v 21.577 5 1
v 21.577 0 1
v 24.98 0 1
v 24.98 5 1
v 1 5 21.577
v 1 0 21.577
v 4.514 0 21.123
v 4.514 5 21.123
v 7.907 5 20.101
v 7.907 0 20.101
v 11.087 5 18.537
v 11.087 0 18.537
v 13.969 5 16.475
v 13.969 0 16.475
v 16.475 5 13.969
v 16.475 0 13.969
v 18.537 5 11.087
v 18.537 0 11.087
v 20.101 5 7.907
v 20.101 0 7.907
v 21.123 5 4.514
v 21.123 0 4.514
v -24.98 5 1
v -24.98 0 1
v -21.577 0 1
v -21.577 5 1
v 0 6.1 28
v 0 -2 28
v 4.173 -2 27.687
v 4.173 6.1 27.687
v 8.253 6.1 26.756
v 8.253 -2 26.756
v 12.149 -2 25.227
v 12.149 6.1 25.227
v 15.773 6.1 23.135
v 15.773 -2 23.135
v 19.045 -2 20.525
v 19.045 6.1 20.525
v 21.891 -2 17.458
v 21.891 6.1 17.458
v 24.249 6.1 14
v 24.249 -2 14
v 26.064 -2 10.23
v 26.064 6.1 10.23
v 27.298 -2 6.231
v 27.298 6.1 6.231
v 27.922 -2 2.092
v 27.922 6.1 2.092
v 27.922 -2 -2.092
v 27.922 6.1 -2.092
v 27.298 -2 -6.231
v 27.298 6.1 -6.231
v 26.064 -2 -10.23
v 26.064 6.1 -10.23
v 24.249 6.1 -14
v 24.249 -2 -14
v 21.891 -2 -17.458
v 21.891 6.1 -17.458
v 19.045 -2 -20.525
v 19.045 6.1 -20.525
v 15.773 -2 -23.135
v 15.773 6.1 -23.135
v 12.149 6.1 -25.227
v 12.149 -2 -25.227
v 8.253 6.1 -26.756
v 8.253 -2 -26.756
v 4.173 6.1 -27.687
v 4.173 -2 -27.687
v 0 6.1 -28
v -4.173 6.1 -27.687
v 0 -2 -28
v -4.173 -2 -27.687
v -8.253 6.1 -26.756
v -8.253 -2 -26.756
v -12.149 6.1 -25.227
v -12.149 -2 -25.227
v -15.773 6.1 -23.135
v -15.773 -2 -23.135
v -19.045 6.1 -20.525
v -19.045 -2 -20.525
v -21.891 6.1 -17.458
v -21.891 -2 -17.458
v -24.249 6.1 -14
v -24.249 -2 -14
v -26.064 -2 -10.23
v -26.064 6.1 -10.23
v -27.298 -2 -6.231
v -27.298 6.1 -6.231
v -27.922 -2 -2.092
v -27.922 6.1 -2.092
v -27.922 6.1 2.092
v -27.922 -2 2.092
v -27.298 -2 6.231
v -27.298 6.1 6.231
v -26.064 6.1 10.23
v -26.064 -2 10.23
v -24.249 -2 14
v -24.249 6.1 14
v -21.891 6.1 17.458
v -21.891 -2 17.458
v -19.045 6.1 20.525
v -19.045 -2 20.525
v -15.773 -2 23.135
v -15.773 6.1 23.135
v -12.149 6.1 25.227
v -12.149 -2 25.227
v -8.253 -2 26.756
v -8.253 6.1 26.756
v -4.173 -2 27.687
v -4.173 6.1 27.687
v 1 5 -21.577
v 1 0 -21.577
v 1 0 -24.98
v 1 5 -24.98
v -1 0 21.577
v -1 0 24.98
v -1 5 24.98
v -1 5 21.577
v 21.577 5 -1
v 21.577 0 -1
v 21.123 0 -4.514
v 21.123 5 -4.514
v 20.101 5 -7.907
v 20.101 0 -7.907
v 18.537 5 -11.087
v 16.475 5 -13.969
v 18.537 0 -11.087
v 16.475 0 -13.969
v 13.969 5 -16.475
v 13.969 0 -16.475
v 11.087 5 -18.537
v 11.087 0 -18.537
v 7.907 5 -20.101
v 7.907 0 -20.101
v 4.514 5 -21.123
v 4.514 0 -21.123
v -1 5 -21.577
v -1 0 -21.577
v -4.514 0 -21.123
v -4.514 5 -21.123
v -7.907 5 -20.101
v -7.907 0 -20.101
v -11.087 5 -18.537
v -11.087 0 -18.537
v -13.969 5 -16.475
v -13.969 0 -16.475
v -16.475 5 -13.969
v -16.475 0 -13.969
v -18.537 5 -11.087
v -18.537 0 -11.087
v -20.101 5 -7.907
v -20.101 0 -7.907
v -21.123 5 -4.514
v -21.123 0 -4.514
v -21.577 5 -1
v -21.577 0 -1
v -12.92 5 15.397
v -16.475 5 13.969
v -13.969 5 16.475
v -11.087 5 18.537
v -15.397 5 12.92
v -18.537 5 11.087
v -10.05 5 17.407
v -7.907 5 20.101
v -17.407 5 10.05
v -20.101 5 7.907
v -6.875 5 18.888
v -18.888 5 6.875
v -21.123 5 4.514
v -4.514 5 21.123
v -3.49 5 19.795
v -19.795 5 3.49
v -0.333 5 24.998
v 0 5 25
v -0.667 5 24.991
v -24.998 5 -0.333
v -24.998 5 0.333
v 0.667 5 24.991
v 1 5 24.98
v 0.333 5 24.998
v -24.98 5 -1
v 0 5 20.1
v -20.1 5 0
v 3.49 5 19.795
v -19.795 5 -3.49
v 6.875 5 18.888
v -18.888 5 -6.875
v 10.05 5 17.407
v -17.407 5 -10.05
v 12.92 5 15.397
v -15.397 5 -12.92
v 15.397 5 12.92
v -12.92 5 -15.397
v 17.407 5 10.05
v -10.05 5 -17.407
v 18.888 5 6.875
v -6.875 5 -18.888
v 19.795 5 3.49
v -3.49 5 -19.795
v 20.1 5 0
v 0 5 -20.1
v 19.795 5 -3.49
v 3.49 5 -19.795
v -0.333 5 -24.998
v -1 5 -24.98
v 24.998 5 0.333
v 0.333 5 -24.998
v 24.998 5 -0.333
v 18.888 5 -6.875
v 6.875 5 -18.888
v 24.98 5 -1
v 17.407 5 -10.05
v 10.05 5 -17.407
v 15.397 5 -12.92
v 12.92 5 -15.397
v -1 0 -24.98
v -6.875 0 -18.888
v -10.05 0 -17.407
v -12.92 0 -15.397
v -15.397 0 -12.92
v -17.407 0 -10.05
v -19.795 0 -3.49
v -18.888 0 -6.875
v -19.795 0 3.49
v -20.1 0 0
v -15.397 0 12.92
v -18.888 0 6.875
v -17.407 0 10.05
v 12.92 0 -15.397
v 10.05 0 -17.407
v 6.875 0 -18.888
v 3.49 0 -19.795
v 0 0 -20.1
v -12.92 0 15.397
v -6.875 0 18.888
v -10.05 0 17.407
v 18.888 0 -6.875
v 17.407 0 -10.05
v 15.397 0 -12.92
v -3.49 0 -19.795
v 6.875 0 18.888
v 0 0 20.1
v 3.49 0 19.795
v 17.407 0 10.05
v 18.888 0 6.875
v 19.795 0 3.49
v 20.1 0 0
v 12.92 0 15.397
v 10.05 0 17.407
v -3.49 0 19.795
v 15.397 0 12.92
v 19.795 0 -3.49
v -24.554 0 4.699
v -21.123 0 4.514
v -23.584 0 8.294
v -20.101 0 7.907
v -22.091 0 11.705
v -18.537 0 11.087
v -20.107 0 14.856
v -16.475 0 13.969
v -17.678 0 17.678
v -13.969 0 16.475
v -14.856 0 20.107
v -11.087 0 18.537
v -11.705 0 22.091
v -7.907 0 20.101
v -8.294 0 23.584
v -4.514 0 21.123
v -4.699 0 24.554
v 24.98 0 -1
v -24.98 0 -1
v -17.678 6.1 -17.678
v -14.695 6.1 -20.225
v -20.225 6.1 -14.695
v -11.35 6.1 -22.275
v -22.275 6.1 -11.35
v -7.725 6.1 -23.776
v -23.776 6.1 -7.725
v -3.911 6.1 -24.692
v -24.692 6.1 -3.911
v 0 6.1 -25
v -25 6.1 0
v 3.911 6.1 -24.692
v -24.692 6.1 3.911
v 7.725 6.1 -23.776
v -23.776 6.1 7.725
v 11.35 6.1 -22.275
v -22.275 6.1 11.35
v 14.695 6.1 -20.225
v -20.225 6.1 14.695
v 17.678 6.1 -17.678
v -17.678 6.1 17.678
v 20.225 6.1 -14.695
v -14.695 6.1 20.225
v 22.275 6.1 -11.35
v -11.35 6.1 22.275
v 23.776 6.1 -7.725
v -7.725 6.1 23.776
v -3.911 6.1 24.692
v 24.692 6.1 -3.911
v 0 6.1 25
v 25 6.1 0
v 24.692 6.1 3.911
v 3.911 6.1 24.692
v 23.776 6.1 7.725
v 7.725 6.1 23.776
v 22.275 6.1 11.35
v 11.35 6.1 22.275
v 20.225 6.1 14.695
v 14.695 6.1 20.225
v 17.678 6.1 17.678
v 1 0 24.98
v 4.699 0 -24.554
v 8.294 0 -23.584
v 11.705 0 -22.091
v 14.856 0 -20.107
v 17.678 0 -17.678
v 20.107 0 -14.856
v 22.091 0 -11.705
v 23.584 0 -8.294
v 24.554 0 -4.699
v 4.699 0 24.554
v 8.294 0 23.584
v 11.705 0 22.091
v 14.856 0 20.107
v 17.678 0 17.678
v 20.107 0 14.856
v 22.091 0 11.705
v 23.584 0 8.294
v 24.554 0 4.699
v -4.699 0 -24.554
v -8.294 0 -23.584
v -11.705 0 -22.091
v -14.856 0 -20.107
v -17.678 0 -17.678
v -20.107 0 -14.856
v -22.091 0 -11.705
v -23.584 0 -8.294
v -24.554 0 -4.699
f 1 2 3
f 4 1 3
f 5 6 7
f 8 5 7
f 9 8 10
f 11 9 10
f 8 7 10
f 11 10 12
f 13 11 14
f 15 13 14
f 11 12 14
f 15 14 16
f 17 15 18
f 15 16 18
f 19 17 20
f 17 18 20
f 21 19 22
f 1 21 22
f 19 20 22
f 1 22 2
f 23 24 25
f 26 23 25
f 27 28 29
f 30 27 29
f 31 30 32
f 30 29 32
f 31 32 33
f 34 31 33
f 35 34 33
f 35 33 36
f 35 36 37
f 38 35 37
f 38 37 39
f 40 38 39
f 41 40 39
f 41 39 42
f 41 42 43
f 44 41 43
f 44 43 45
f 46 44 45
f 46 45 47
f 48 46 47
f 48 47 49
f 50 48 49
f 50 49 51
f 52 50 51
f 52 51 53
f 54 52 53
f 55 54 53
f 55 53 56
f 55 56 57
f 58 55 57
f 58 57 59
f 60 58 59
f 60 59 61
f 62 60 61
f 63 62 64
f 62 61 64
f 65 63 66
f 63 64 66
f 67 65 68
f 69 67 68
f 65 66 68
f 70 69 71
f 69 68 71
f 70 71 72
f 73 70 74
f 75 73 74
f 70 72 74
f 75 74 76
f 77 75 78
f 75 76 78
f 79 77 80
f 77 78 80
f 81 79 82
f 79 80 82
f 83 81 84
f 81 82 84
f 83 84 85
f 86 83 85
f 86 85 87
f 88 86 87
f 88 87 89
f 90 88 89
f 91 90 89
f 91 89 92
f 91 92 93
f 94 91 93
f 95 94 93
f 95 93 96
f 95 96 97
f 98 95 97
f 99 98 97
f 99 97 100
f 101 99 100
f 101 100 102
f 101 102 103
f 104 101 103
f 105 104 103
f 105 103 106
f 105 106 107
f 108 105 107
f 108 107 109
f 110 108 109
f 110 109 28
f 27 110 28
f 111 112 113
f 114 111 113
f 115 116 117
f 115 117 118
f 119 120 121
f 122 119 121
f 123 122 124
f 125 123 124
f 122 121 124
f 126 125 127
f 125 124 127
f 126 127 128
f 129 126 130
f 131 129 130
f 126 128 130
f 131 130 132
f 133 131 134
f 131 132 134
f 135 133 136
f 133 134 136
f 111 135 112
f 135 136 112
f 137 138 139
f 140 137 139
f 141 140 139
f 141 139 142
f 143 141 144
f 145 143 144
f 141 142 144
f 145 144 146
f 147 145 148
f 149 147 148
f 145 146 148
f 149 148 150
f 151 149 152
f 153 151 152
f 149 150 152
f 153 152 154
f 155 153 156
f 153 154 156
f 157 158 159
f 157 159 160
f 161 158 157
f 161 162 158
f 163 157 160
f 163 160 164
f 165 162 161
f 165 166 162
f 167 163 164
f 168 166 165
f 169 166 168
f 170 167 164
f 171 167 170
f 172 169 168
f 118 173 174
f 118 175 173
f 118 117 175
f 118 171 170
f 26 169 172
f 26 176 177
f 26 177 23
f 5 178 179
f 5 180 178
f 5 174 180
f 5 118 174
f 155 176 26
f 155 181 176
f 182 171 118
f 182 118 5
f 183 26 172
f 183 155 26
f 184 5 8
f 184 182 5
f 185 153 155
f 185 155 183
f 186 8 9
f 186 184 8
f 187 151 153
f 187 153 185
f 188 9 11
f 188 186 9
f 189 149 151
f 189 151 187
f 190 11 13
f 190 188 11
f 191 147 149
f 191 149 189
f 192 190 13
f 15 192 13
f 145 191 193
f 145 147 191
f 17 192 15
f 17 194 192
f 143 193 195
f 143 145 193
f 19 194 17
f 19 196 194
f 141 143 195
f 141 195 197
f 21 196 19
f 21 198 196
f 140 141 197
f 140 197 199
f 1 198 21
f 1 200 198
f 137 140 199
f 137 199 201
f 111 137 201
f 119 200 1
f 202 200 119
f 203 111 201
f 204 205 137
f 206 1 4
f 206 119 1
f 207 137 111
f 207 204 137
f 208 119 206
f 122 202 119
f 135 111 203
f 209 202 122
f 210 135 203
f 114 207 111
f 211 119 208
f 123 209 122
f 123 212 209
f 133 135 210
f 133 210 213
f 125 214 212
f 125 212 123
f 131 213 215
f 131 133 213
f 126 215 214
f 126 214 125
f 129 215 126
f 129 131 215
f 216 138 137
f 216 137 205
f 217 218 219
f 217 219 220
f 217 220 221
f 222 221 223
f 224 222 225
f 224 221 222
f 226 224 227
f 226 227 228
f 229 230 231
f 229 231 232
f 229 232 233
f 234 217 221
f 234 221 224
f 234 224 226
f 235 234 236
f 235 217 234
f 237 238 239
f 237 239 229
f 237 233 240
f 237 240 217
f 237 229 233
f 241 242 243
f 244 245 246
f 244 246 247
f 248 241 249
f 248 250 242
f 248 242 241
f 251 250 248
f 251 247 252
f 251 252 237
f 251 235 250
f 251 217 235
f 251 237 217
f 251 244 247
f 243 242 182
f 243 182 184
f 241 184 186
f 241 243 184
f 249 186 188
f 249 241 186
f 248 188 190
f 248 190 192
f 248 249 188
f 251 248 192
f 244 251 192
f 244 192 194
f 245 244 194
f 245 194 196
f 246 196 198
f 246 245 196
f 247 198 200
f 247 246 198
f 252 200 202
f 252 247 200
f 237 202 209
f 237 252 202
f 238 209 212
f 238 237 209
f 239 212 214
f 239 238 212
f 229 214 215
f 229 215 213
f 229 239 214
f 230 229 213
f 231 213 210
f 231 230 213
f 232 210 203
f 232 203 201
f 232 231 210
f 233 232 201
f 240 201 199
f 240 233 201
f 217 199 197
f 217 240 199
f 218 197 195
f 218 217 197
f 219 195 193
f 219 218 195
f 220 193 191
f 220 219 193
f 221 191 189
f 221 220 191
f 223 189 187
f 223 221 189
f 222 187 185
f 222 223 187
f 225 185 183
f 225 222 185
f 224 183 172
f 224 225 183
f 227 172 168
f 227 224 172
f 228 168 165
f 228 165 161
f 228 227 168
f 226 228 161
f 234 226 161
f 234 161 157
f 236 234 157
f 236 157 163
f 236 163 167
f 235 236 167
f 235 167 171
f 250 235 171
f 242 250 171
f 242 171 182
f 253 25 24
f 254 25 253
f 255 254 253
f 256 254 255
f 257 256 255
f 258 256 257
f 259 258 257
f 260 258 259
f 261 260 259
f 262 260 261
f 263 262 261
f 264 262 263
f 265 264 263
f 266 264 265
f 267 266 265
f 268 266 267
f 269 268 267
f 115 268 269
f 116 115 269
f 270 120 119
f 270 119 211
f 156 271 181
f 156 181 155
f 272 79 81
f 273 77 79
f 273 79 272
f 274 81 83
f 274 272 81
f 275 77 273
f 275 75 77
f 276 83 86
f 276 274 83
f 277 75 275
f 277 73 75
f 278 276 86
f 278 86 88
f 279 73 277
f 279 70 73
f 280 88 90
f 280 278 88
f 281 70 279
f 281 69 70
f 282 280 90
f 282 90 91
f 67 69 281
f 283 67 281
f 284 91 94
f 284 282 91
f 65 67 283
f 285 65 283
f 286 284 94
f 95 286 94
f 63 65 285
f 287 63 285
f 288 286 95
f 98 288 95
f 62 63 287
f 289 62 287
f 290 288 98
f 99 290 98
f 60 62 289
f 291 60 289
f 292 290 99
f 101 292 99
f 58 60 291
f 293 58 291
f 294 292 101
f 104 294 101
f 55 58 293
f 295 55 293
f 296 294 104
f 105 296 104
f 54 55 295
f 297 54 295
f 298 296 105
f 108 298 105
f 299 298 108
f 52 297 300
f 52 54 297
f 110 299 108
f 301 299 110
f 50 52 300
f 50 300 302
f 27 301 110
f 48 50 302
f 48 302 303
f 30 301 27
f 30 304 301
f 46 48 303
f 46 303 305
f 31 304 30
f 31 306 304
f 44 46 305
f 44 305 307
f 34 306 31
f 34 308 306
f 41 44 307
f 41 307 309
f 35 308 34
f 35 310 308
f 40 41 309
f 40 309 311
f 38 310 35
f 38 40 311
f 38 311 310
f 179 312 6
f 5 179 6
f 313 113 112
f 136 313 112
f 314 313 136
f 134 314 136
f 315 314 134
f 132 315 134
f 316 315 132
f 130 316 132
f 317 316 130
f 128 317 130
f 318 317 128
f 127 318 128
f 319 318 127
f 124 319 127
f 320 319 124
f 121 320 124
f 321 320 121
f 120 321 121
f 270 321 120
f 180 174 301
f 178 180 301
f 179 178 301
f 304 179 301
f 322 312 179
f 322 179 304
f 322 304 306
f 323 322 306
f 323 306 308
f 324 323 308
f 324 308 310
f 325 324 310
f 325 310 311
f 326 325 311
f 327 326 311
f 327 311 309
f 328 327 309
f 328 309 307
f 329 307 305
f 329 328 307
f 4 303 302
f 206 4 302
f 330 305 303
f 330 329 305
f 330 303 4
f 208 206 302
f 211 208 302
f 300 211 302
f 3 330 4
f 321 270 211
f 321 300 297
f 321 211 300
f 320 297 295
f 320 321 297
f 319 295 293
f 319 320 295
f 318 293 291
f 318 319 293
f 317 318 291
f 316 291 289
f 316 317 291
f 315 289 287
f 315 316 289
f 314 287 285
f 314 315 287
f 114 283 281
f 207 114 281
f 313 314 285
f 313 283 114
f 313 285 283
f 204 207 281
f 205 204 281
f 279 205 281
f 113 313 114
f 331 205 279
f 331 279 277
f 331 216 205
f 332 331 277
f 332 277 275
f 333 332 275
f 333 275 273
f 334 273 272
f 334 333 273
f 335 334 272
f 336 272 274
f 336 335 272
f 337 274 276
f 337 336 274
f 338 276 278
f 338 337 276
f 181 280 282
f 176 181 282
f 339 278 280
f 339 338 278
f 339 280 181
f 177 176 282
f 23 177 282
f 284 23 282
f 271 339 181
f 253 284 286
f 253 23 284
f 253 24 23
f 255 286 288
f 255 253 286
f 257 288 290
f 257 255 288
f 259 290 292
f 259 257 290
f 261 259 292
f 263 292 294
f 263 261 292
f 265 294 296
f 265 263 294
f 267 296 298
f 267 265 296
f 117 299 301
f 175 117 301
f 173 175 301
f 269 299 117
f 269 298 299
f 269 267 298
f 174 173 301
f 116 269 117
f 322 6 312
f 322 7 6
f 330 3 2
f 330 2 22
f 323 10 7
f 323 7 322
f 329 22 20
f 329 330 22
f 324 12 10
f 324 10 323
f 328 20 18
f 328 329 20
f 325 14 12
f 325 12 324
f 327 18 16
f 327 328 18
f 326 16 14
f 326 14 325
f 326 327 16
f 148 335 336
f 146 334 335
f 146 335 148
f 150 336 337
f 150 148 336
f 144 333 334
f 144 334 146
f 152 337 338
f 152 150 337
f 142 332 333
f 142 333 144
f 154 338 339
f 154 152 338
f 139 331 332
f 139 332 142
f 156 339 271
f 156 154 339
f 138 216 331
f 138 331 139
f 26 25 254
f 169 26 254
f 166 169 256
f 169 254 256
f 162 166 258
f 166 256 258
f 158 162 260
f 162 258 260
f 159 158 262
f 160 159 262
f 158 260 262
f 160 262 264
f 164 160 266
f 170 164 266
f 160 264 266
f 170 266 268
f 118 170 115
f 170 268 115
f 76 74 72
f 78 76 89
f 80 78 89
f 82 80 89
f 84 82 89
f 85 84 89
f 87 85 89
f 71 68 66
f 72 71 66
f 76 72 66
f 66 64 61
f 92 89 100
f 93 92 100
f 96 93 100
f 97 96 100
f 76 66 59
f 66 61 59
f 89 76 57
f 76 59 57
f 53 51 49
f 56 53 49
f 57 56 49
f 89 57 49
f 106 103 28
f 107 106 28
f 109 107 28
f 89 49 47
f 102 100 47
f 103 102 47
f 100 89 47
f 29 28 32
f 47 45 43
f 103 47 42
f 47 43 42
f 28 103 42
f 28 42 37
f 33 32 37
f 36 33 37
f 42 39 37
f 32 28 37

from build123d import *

# Parameters (mm, degrees)
SKETCH1_R           = 28
SKETCH1_R_2         = 25
BOSS_EXTRUDE1_DEPTH = 8
BOSS_EXTRUDE2_START = -2
SKETCH1_3_R         = 28
BOSS_EXTRUDE2_DEPTH = 2
SKETCH1_5_R         = 21.6
SKETCH1_5_R_2       = 20.1
BOSS_EXTRUDE3_DEPTH = 5
CUT_EXTRUDE1_START  = -1.9
SKETCH5_R           = 28
CUT_EXTRUDE1_DEPTH  = 1.9
SKETCH10_W          = 2
SKETCH10_H          = 3.423160565
SKETCH10_W_2        = 3.423160565
SKETCH10_H_2        = 2
BOSS_EXTRUDE4_DEPTH = 5


with BuildPart() as part:
    # Sketch1 → Boss-Extrude1 (new body)
    with BuildSketch(Plane(origin=(0, 0, 0), x_dir=(1, 0, 0), z_dir=(0, 1, 0))):
        with Locations(Location((0, 0, 0), (0, 0, 270))):
            Circle(SKETCH1_R)
        with Locations(Location((0, 0, 0), (0, 0, 270))):
            Circle(SKETCH1_R_2, mode=Mode.SUBTRACT)
    extrude(amount=BOSS_EXTRUDE1_DEPTH)

    # Sketch1<3> → Boss-Extrude2 (add)
    with BuildSketch(Plane(origin=(0, 0, 0), x_dir=(1, 0, 0), z_dir=(0, 1, 0)).offset(BOSS_EXTRUDE2_START)):
        with Locations(Location((0, 0, 0), (0, 0, 270))):
            Circle(SKETCH1_3_R)
    extrude(amount=BOSS_EXTRUDE2_DEPTH)

    # Sketch1<5> → Boss-Extrude3 (add)
    with BuildSketch(Plane(origin=(0, 0, 0), x_dir=(1, 0, 0), z_dir=(0, 1, 0))):
        with Locations(Location((0, 0, 0), (0, 0, 270))):
            Circle(SKETCH1_5_R)
        with Locations(Location((0, 0, 0), (0, 0, 270))):
            Circle(SKETCH1_5_R_2, mode=Mode.SUBTRACT)
    extrude(amount=BOSS_EXTRUDE3_DEPTH)

    # Sketch5 → Cut-Extrude1 (cut)
    with BuildSketch(Plane(origin=(0, 8, 0), x_dir=(1, 0, 0), z_dir=(0, 1, 0)).offset(CUT_EXTRUDE1_START)):
        with Locations(Location((0, 0, 0), (0, 0, 270))):
            Circle(SKETCH5_R)
    extrude(amount=CUT_EXTRUDE1_DEPTH, mode=Mode.SUBTRACT)

    # Sketch10 → Boss-Extrude4 (add)
    with BuildSketch(Plane(origin=(0, 0, 0), x_dir=(1, 0, 0), z_dir=(0, 1, 0))):
        with Locations((0, -23.288419717)):
            Rectangle(SKETCH10_W, SKETCH10_H)
        with Locations((-23.288419717, 0)):
            Rectangle(SKETCH10_W_2, SKETCH10_H_2)
        with Locations((23.288419717, 0)):
            Rectangle(SKETCH10_W_2, SKETCH10_H_2)
        with Locations((0, 23.288419717)):
            Rectangle(SKETCH10_W, SKETCH10_H)
    extrude(amount=BOSS_EXTRUDE4_DEPTH)


solid = part.part
